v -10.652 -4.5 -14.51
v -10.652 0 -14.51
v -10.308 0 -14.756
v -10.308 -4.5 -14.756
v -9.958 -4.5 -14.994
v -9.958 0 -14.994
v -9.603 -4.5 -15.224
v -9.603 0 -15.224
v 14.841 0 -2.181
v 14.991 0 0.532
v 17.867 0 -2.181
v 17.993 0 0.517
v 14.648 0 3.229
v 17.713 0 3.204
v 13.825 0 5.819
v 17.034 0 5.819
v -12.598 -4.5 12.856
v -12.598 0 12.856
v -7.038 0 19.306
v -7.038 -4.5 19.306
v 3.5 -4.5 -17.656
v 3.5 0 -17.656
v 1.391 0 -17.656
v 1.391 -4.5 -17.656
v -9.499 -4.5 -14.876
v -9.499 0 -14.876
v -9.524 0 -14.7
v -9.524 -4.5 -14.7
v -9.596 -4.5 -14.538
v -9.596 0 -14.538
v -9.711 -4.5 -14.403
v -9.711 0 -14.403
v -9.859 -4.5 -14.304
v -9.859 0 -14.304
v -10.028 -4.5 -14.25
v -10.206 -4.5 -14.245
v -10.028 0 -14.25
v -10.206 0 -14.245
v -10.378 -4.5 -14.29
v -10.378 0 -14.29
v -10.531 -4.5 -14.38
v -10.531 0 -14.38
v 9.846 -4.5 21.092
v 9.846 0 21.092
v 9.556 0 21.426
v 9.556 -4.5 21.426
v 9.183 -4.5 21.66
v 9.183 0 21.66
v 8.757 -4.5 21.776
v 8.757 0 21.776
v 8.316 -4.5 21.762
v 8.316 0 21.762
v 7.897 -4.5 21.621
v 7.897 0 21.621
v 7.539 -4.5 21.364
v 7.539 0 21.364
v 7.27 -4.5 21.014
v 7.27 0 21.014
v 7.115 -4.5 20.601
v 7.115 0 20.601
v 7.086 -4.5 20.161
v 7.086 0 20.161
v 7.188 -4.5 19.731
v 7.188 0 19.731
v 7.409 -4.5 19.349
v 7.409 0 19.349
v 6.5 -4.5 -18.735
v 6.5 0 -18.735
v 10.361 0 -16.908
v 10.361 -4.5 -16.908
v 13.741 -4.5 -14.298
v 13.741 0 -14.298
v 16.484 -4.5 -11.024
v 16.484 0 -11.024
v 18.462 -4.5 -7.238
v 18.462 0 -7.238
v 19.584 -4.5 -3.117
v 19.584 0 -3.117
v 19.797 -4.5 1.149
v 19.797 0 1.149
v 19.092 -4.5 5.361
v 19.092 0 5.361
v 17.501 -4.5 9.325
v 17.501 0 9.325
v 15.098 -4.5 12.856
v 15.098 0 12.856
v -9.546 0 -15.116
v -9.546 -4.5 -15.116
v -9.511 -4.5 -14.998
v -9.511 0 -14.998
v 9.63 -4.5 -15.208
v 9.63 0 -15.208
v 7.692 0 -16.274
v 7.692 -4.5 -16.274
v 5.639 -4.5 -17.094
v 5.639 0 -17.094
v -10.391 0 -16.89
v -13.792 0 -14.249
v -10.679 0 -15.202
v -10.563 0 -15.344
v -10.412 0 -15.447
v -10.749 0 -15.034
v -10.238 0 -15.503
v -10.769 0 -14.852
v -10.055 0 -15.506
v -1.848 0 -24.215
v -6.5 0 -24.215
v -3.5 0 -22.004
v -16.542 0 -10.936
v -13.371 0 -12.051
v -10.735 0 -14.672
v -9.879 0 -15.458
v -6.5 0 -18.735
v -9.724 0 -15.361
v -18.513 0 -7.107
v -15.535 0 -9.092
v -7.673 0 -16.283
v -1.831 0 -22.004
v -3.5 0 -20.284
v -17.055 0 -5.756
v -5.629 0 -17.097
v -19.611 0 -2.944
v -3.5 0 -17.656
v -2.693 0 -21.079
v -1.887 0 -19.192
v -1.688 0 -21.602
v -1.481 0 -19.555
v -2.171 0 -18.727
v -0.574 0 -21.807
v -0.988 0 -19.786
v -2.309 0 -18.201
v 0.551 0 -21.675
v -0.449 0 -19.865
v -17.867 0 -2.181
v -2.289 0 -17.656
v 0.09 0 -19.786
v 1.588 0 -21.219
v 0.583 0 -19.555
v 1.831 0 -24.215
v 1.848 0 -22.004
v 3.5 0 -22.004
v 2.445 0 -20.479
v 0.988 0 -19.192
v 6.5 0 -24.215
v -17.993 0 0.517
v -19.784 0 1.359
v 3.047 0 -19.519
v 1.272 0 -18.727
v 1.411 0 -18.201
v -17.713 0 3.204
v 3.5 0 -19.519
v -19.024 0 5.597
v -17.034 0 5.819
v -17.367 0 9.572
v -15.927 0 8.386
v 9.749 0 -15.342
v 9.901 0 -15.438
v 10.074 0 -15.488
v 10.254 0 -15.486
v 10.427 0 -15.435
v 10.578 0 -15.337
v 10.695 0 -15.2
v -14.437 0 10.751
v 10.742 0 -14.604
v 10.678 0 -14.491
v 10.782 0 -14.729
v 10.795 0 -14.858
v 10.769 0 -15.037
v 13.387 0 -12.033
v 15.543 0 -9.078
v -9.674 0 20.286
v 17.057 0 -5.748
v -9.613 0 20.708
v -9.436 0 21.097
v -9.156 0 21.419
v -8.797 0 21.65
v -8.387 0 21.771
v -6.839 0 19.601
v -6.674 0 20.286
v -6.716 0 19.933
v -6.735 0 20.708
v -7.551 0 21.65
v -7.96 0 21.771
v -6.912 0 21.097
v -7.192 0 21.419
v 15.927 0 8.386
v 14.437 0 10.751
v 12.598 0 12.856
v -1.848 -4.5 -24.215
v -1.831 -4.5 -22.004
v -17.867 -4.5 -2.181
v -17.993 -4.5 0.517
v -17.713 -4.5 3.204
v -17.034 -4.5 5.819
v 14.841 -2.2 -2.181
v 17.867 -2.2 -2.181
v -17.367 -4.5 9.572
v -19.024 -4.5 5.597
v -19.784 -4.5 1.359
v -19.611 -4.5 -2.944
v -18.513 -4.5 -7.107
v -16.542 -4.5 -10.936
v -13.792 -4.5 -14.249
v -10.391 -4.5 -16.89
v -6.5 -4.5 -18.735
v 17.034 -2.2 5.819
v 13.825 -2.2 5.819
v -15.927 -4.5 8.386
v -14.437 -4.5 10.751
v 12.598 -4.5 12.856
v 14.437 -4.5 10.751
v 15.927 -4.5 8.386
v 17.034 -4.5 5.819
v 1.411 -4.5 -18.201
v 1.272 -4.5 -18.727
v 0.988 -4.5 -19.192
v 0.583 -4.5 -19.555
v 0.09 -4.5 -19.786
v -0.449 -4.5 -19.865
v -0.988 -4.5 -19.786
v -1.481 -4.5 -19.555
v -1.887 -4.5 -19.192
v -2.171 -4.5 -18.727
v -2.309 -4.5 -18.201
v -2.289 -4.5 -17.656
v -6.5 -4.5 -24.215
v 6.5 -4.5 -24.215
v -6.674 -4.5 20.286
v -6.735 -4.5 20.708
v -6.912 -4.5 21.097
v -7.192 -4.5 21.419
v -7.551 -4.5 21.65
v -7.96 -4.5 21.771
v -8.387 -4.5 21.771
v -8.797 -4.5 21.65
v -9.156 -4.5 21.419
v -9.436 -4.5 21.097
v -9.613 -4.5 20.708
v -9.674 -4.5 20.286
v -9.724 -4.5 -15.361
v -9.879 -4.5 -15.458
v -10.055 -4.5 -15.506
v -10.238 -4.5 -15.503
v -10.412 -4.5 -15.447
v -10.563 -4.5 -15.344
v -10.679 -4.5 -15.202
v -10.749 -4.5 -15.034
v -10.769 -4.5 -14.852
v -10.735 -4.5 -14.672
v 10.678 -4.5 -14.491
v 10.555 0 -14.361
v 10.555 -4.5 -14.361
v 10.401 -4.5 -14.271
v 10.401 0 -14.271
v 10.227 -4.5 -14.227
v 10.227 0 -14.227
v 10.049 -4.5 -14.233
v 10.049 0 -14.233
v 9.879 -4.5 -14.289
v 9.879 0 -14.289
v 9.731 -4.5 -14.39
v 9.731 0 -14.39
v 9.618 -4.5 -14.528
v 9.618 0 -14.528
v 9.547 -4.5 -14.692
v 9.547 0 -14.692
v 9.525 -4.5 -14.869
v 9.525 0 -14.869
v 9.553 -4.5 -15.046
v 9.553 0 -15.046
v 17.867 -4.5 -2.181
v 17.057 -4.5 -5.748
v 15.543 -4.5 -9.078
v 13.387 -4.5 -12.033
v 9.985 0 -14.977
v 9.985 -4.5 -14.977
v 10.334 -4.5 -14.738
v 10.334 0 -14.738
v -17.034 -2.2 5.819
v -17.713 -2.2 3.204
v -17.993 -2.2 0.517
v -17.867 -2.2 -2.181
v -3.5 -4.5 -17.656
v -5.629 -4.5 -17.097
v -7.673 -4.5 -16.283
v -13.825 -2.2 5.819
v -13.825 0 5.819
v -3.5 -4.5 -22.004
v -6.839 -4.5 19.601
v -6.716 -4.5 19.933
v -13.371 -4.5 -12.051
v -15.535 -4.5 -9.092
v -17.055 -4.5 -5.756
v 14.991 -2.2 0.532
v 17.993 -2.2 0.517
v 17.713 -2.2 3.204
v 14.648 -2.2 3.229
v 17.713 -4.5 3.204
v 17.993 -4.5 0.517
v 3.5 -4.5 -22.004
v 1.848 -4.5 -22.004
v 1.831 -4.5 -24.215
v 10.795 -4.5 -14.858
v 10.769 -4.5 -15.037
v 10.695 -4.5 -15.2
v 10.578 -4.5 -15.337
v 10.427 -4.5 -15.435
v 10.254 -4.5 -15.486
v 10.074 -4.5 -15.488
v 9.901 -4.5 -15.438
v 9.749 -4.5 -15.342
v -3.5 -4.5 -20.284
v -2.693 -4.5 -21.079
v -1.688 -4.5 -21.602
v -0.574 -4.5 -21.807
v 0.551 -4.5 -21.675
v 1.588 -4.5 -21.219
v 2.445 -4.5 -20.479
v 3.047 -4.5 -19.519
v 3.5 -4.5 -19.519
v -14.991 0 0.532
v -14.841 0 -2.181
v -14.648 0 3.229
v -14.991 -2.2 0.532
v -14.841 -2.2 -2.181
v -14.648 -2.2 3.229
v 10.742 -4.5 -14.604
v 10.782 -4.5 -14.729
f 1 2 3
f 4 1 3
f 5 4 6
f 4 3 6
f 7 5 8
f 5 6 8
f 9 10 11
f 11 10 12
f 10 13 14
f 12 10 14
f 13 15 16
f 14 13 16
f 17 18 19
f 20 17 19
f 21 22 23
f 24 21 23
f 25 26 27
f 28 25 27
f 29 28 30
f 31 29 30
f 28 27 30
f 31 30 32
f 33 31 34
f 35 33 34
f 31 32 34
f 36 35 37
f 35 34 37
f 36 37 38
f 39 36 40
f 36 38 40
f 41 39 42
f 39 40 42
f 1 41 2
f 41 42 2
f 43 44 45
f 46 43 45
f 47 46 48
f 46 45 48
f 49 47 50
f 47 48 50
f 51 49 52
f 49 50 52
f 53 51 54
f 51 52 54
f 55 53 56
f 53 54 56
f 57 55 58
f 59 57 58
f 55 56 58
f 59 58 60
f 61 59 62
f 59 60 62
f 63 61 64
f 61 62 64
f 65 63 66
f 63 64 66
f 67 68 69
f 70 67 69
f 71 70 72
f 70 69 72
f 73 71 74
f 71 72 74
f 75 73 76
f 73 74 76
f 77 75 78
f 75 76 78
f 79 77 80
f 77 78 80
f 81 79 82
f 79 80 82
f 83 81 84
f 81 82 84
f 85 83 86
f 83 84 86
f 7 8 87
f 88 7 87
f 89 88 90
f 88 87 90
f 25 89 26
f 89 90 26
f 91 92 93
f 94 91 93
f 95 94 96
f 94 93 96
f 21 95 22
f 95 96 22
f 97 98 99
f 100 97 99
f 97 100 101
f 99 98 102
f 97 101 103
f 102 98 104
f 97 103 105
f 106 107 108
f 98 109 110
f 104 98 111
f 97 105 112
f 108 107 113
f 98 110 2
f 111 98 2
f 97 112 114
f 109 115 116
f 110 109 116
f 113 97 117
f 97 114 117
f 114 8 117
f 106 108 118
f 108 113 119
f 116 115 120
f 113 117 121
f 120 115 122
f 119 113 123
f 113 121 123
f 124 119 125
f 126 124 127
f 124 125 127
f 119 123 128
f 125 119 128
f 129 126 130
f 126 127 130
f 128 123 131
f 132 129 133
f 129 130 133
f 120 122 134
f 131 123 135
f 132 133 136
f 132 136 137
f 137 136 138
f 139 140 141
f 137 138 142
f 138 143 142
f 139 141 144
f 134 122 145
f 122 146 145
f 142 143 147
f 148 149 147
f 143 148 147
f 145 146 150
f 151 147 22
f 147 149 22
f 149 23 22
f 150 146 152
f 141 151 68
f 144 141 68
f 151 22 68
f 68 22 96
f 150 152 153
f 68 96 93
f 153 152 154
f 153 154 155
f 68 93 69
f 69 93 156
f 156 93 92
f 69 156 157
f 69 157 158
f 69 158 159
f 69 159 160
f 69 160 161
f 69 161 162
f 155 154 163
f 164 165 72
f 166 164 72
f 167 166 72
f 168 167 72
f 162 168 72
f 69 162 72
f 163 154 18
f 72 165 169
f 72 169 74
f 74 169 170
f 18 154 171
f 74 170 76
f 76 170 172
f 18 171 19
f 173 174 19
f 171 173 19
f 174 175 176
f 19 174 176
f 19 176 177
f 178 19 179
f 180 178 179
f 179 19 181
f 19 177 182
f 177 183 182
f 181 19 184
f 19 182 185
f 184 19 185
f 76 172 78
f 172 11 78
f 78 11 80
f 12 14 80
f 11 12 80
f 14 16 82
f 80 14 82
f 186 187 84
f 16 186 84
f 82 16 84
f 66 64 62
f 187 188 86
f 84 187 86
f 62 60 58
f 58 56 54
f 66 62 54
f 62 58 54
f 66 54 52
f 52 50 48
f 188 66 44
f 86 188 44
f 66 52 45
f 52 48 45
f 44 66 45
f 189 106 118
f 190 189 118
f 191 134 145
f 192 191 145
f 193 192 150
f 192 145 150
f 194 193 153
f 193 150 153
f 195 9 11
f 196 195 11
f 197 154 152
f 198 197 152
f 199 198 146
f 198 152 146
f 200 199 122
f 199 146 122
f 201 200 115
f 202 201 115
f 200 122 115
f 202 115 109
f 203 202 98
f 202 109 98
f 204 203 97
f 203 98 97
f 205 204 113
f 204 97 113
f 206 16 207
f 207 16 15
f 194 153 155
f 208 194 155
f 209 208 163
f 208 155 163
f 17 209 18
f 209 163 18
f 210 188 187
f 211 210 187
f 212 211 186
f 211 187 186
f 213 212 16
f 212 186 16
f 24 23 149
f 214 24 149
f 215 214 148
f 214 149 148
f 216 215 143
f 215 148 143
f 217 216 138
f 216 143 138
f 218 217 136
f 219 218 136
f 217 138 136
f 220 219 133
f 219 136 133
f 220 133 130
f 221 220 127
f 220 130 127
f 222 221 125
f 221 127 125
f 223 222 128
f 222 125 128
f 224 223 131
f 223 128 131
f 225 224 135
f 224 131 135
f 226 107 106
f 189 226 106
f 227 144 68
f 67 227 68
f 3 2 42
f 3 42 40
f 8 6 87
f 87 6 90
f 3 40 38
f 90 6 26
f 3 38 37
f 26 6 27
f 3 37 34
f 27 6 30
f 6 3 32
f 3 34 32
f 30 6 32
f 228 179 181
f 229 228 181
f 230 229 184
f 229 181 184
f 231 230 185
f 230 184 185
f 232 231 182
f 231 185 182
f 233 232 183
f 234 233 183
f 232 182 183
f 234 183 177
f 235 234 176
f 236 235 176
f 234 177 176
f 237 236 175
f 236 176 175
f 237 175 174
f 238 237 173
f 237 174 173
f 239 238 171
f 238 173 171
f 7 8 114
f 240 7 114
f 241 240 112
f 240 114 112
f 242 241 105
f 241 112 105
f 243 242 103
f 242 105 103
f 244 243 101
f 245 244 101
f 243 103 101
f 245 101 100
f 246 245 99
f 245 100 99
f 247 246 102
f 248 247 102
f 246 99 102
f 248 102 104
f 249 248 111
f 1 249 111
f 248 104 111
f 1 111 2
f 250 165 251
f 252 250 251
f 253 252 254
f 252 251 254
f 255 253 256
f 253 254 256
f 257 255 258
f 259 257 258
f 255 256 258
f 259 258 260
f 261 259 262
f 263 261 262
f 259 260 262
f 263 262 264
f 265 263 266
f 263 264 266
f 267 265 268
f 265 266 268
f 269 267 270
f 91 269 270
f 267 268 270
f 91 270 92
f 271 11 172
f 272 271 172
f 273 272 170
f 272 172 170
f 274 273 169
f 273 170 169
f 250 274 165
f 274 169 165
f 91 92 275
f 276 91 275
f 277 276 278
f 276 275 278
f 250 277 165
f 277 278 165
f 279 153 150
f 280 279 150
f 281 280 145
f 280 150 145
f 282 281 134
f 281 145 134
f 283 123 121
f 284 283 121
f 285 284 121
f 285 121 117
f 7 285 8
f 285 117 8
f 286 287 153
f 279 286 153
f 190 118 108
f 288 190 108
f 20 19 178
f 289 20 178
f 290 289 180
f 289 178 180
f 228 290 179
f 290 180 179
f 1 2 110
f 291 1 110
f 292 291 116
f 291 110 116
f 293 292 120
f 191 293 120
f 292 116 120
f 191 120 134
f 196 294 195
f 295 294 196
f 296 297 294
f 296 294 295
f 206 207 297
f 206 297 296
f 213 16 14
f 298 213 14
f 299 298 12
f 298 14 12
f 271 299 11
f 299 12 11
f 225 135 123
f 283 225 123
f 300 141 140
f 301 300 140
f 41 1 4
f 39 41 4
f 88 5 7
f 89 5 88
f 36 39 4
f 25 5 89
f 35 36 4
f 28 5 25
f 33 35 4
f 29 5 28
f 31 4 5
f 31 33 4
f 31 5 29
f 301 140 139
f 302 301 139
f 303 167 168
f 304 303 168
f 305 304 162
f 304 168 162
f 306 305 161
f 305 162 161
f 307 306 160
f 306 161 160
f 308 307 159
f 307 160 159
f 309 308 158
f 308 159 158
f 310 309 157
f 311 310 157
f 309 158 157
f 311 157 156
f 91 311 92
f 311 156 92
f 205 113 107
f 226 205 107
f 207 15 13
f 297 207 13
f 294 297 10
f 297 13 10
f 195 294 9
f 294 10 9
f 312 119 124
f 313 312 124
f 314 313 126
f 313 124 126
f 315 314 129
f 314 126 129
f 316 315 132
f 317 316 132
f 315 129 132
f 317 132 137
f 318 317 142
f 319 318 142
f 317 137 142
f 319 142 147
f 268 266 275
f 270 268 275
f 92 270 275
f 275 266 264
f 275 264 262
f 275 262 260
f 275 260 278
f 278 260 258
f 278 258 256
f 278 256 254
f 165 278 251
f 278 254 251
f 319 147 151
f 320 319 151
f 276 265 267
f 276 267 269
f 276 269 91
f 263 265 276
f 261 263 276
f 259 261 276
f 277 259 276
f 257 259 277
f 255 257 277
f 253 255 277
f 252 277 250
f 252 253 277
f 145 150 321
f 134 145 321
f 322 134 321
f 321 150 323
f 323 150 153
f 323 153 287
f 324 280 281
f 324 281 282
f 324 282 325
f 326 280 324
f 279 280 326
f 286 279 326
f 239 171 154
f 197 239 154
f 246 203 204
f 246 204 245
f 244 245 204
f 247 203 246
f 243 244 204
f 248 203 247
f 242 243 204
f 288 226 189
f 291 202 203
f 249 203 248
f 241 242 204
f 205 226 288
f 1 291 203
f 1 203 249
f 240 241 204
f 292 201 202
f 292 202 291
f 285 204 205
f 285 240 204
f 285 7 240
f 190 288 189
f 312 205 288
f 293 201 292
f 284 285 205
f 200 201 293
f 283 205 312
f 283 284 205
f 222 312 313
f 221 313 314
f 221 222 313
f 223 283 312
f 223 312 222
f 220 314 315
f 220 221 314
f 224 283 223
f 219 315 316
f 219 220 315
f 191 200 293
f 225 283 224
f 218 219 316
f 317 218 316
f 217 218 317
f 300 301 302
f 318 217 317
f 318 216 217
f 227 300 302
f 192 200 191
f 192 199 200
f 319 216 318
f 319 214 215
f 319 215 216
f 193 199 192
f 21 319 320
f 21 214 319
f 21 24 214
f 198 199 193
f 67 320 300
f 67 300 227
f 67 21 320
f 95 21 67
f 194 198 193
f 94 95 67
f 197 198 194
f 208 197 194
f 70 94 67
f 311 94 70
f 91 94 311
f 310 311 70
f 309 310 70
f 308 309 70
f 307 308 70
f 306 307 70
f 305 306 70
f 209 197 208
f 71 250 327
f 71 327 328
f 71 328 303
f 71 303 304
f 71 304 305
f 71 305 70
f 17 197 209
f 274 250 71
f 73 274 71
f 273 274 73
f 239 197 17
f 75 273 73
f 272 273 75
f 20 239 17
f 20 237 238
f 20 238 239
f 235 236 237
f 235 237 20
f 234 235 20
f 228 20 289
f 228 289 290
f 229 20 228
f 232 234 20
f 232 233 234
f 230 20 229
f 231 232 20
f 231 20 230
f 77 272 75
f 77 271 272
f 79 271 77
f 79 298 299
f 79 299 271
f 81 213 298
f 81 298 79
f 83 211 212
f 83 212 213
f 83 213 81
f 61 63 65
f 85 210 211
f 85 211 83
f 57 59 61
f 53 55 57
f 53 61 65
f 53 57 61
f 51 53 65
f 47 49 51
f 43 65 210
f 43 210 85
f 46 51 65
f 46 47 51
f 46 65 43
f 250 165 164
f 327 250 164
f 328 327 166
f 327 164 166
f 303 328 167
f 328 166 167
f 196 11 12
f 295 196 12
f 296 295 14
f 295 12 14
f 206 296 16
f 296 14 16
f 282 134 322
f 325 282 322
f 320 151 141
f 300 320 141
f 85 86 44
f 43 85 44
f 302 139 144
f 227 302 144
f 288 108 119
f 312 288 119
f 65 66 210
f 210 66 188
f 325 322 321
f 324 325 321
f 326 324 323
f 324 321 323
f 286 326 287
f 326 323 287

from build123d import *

# Parameters (mm, degrees)
F1_DEPTH = 4.5
F2_DEPTH = 2.2


with BuildPart() as f1:
    # F0 (on Front) → F1 (new body)
    with BuildSketch(Plane.XZ):
        with BuildLine():
            Line((-12.5982642878, 12.8562722799), (-17.3673227921, 9.5716989334))
            ThreePointArc((-17.3673227921, 9.5716989334), (-18.5128661298, -7.1073981948), (-6.5, -18.7347623801))
            ThreePointArc((-6.5, -18.7347623801), (-5.0153521077, -19.1856082696), (-3.5, -19.5189989866))
            Line((-3.5, -19.5189989866), (-3.5, -17.656443583))
            ThreePointArc((-3.5, -17.656443583), (-6.6633813431, -16.7212245089), (-9.6029714558, -15.2244191751))
            ThreePointArc((-9.6029714558, -15.2244191751), (-10.4915008811, -15.4010270522), (-10.6524086102, -14.5095206951))
            ThreePointArc((-10.6524086102, -14.5095206951), (-15.5351423919, -9.0917188069), (-17.8673478305, -2.1812568633))
            ThreePointArc((-17.8673478305, -2.1812568633), (-17.9030269403, 1.8659116739), (-17.033561821, 5.8187431367))
            ThreePointArc((-17.033561821, 5.8187431367), (-15.2280328258, 9.5972400332), (-12.5982642878, 12.8562722799))
        make_face()
        with BuildLine():
            Line((-9.6738959998, 20.2858578414), (-17.3673227921, 9.5716989334))
            Line((-17.3673227921, 9.5716989334), (-12.5982642878, 12.8562722799))
            Line((-12.5982642878, 12.8562722799), (-7.0377798874, 19.3064497655))
            ThreePointArc((-7.0377798874, 19.3064497655), (-8.696306677, 18.8797685539), (-9.6738959998, 20.2858578414))
        make_face()
        with BuildLine():
            ThreePointArc((-3.5, -19.5189989866), (-5.0153521077, -19.1856082696), (-6.5, -18.7347623801))
            Line((-6.5, -18.7347623801), (-6.5, -24.2152123027))
            Line((-6.5, -24.2152123027), (-1.8481902329, -24.2152123027))
            Line((-1.8481902329, -24.2152123027), (-1.8312213279, -22.0041828084))
            Line((-1.8312213279, -22.0041828084), (-3.5, -22.0041828084))
            Line((-3.5, -22.0041828084), (-3.5, -20.2840574679))
            ThreePointArc((-3.5, -20.2840574679), (-3.7451179805, -19.9145035902), (-3.945689667, -19.5189989866))
            Line((-3.945689667, -19.5189989866), (-3.5, -19.5189989866))
        make_face()
        with BuildLine():
            ThreePointArc((-6.6738959998, 20.2858578414), (-8.1738959998, 21.7858578414), (-9.6738959998, 20.2858578414))
            ThreePointArc((-9.6738959998, 20.2858578414), (-8.696306677, 18.8797685539), (-7.0377798874, 19.3064497655))
            ThreePointArc((-7.0377798874, 19.3064497655), (-6.7678067123, 19.7634471641), (-6.6738959998, 20.2858578414))
        make_face()
        with BuildLine():
            Line((-3.5, -17.656443583), (-3.5, -19.5189989866))
            Line((-3.5, -19.5189989866), (-3.5, -20.2840574679))
            ThreePointArc((-3.5, -20.2840574679), (-0.0064092924, -21.7831240851), (3.0474594497, -19.5189989866))
            Line((3.0474594497, -19.5189989866), (3.5, -19.5189989866))
            Line((3.5, -19.5189989866), (3.5, -17.656443583))
            Line((3.5, -17.656443583), (3.3503894936, -17.656443583))
            Line((3.3503894936, -17.656443583), (2.321347558, -17.656443583))
            Line((2.321347558, -17.656443583), (1.3912129293, -17.656443583))
            ThreePointArc((1.3912129293, -17.656443583), (-0.4491151087, -19.8654973153), (-2.2894431467, -17.656443583))
            Line((-2.2894431467, -17.656443583), (-2.854652442, -17.656443583))
            Line((-2.854652442, -17.656443583), (-3.5, -17.656443583))
        make_face()
        with BuildLine():
            Line((-3.5, -20.2840574679), (-3.5, -19.5189989866))
            Line((-3.5, -19.5189989866), (-3.945689667, -19.5189989866))
            ThreePointArc((-3.945689667, -19.5189989866), (-3.7451179805, -19.9145035902), (-3.5, -20.2840574679))
        make_face()
        with BuildLine():
            ThreePointArc((6.5, -18.7347623801), (5.0153521077, -19.1856082696), (3.5, -19.5189989866))
            Line((3.5, -19.5189989866), (3.5, -22.0041828084))
            Line((3.5, -22.0041828084), (1.8481902329, -22.0041828084))
            Line((1.8481902329, -22.0041828084), (1.8312213279, -24.2152123027))
            Line((1.8312213279, -24.2152123027), (6.5, -24.2152123027))
            Line((6.5, -24.2152123027), (6.5, -18.7347623801))
        make_face()
        with BuildLine():
            Line((3.5, -17.656443583), (3.5, -19.5189989866))
            ThreePointArc((3.5, -19.5189989866), (5.0153521077, -19.1856082696), (6.5, -18.7347623801))
            ThreePointArc((6.5, -18.7347623801), (19.1342526058, -5.2078497151), (15.0982642878, 12.8562722799))
            Line((15.0982642878, 12.8562722799), (12.5982642878, 12.8562722799))
            ThreePointArc((12.5982642878, 12.8562722799), (15.2280328258, 9.5972400332), (17.033561821, 5.8187431367))
            ThreePointArc((17.033561821, 5.8187431367), (17.9030269403, 1.8659116739), (17.8673478305, -2.1812568633))
            ThreePointArc((17.8673478305, -2.1812568633), (15.5430874553, -9.0781293423), (10.6777704031, -14.4908667518))
            ThreePointArc((10.6777704031, -14.4908667518), (10.7649831427, -14.665553176), (10.795, -14.8584790608))
            ThreePointArc((10.795, -14.8584790608), (10.3422246395, -15.4667710801), (9.6295852574, -15.2075996715))
            ThreePointArc((9.6295852574, -15.2075996715), (6.6780020503, -16.7153907707), (3.5, -17.656443583))
        make_face()
        with BuildLine():
            Line((12.5982642878, 12.8562722799), (15.0982642878, 12.8562722799))
            Line((15.0982642878, 12.8562722799), (9.8459355165, 21.0923907272))
            ThreePointArc((9.8459355165, 21.0923907272), (10.0211981842, 20.7059334899), (10.0812202505, 20.2858578414))
            ThreePointArc((10.0812202505, 20.2858578414), (9.0773524967, 18.8702827659), (7.4094165247, 19.3494412523))
            Line((7.4094165247, 19.3494412523), (12.5982642878, 12.8562722799))
        make_face()
        with BuildLine():
            ThreePointArc((10.0812202505, 20.2858578414), (10.0211981842, 20.7059334899), (9.8459355165, 21.0923907272))
            ThreePointArc((9.8459355165, 21.0923907272), (7.7085081809, 21.5058470395), (7.4094165247, 19.3494412523))
            ThreePointArc((7.4094165247, 19.3494412523), (9.0773524967, 18.8702827659), (10.0812202505, 20.2858578414))
        make_face()
    extrude(amount=F1_DEPTH)


with BuildPart() as f1b:
    # F0 (on Front) → F1, piece 2 (new body)
    with BuildSketch(Plane.XZ):
        with BuildLine():
            ThreePointArc((-10.6524086102, -14.5095206951), (-10.1339960215, -14.8762268279), (-9.6029714558, -15.2244191751))
            ThreePointArc((-9.6029714558, -15.2244191751), (-9.5255448734, -15.0579194266), (-9.4989960215, -14.8762268279))
            ThreePointArc((-9.4989960215, -14.8762268279), (-9.9415992879, -14.2710751966), (-10.6524086102, -14.5095206951))
        make_face()
    extrude(amount=F1_DEPTH)


with BuildPart() as f1c:
    # F0 (on Front) → F1, piece 3 (new body)
    with BuildSketch(Plane.XZ):
        with BuildLine():
            ThreePointArc((10.6777704031, -14.4908667518), (9.8015777778, -14.3343049384), (9.6295852574, -15.2075996715))
            ThreePointArc((9.6295852574, -15.2075996715), (10.16, -14.8584790608), (10.6777704031, -14.4908667518))
        make_face()
    extrude(amount=F1_DEPTH)


with BuildPart() as f2:
    # F0 (on Front) → F2 (new body)
    with BuildSketch(Plane.XZ):
        with BuildLine():
            Line((-13.8254196431, 5.8187431367), (-17.033561821, 5.8187431367))
            ThreePointArc((-17.033561821, 5.8187431367), (-17.9030269403, 1.8659116739), (-17.8673478305, -2.1812568633))
            Line((-17.8673478305, -2.1812568633), (-14.8405565427, -2.1812568633))
            ThreePointArc((-14.8405565427, -2.1812568633), (-14.8806769897, 1.8882405378), (-13.8254196431, 5.8187431367))
        make_face()
    extrude(amount=F2_DEPTH)


with BuildPart() as f2b:
    # F0 (on Front) → F2, piece 2 (new body)
    with BuildSketch(Plane.XZ):
        with BuildLine():
            Line((14.8405565427, -2.1812568633), (17.8673478305, -2.1812568633))
            ThreePointArc((17.8673478305, -2.1812568633), (17.9030269403, 1.8659116739), (17.033561821, 5.8187431367))
            Line((17.033561821, 5.8187431367), (13.8254196431, 5.8187431367))
            ThreePointArc((13.8254196431, 5.8187431367), (14.8806769897, 1.8882405378), (14.8405565427, -2.1812568633))
        make_face()
    extrude(amount=F2_DEPTH)


solid = Compound([f1.part, f1b.part, f1c.part, f2.part, f2b.part])
